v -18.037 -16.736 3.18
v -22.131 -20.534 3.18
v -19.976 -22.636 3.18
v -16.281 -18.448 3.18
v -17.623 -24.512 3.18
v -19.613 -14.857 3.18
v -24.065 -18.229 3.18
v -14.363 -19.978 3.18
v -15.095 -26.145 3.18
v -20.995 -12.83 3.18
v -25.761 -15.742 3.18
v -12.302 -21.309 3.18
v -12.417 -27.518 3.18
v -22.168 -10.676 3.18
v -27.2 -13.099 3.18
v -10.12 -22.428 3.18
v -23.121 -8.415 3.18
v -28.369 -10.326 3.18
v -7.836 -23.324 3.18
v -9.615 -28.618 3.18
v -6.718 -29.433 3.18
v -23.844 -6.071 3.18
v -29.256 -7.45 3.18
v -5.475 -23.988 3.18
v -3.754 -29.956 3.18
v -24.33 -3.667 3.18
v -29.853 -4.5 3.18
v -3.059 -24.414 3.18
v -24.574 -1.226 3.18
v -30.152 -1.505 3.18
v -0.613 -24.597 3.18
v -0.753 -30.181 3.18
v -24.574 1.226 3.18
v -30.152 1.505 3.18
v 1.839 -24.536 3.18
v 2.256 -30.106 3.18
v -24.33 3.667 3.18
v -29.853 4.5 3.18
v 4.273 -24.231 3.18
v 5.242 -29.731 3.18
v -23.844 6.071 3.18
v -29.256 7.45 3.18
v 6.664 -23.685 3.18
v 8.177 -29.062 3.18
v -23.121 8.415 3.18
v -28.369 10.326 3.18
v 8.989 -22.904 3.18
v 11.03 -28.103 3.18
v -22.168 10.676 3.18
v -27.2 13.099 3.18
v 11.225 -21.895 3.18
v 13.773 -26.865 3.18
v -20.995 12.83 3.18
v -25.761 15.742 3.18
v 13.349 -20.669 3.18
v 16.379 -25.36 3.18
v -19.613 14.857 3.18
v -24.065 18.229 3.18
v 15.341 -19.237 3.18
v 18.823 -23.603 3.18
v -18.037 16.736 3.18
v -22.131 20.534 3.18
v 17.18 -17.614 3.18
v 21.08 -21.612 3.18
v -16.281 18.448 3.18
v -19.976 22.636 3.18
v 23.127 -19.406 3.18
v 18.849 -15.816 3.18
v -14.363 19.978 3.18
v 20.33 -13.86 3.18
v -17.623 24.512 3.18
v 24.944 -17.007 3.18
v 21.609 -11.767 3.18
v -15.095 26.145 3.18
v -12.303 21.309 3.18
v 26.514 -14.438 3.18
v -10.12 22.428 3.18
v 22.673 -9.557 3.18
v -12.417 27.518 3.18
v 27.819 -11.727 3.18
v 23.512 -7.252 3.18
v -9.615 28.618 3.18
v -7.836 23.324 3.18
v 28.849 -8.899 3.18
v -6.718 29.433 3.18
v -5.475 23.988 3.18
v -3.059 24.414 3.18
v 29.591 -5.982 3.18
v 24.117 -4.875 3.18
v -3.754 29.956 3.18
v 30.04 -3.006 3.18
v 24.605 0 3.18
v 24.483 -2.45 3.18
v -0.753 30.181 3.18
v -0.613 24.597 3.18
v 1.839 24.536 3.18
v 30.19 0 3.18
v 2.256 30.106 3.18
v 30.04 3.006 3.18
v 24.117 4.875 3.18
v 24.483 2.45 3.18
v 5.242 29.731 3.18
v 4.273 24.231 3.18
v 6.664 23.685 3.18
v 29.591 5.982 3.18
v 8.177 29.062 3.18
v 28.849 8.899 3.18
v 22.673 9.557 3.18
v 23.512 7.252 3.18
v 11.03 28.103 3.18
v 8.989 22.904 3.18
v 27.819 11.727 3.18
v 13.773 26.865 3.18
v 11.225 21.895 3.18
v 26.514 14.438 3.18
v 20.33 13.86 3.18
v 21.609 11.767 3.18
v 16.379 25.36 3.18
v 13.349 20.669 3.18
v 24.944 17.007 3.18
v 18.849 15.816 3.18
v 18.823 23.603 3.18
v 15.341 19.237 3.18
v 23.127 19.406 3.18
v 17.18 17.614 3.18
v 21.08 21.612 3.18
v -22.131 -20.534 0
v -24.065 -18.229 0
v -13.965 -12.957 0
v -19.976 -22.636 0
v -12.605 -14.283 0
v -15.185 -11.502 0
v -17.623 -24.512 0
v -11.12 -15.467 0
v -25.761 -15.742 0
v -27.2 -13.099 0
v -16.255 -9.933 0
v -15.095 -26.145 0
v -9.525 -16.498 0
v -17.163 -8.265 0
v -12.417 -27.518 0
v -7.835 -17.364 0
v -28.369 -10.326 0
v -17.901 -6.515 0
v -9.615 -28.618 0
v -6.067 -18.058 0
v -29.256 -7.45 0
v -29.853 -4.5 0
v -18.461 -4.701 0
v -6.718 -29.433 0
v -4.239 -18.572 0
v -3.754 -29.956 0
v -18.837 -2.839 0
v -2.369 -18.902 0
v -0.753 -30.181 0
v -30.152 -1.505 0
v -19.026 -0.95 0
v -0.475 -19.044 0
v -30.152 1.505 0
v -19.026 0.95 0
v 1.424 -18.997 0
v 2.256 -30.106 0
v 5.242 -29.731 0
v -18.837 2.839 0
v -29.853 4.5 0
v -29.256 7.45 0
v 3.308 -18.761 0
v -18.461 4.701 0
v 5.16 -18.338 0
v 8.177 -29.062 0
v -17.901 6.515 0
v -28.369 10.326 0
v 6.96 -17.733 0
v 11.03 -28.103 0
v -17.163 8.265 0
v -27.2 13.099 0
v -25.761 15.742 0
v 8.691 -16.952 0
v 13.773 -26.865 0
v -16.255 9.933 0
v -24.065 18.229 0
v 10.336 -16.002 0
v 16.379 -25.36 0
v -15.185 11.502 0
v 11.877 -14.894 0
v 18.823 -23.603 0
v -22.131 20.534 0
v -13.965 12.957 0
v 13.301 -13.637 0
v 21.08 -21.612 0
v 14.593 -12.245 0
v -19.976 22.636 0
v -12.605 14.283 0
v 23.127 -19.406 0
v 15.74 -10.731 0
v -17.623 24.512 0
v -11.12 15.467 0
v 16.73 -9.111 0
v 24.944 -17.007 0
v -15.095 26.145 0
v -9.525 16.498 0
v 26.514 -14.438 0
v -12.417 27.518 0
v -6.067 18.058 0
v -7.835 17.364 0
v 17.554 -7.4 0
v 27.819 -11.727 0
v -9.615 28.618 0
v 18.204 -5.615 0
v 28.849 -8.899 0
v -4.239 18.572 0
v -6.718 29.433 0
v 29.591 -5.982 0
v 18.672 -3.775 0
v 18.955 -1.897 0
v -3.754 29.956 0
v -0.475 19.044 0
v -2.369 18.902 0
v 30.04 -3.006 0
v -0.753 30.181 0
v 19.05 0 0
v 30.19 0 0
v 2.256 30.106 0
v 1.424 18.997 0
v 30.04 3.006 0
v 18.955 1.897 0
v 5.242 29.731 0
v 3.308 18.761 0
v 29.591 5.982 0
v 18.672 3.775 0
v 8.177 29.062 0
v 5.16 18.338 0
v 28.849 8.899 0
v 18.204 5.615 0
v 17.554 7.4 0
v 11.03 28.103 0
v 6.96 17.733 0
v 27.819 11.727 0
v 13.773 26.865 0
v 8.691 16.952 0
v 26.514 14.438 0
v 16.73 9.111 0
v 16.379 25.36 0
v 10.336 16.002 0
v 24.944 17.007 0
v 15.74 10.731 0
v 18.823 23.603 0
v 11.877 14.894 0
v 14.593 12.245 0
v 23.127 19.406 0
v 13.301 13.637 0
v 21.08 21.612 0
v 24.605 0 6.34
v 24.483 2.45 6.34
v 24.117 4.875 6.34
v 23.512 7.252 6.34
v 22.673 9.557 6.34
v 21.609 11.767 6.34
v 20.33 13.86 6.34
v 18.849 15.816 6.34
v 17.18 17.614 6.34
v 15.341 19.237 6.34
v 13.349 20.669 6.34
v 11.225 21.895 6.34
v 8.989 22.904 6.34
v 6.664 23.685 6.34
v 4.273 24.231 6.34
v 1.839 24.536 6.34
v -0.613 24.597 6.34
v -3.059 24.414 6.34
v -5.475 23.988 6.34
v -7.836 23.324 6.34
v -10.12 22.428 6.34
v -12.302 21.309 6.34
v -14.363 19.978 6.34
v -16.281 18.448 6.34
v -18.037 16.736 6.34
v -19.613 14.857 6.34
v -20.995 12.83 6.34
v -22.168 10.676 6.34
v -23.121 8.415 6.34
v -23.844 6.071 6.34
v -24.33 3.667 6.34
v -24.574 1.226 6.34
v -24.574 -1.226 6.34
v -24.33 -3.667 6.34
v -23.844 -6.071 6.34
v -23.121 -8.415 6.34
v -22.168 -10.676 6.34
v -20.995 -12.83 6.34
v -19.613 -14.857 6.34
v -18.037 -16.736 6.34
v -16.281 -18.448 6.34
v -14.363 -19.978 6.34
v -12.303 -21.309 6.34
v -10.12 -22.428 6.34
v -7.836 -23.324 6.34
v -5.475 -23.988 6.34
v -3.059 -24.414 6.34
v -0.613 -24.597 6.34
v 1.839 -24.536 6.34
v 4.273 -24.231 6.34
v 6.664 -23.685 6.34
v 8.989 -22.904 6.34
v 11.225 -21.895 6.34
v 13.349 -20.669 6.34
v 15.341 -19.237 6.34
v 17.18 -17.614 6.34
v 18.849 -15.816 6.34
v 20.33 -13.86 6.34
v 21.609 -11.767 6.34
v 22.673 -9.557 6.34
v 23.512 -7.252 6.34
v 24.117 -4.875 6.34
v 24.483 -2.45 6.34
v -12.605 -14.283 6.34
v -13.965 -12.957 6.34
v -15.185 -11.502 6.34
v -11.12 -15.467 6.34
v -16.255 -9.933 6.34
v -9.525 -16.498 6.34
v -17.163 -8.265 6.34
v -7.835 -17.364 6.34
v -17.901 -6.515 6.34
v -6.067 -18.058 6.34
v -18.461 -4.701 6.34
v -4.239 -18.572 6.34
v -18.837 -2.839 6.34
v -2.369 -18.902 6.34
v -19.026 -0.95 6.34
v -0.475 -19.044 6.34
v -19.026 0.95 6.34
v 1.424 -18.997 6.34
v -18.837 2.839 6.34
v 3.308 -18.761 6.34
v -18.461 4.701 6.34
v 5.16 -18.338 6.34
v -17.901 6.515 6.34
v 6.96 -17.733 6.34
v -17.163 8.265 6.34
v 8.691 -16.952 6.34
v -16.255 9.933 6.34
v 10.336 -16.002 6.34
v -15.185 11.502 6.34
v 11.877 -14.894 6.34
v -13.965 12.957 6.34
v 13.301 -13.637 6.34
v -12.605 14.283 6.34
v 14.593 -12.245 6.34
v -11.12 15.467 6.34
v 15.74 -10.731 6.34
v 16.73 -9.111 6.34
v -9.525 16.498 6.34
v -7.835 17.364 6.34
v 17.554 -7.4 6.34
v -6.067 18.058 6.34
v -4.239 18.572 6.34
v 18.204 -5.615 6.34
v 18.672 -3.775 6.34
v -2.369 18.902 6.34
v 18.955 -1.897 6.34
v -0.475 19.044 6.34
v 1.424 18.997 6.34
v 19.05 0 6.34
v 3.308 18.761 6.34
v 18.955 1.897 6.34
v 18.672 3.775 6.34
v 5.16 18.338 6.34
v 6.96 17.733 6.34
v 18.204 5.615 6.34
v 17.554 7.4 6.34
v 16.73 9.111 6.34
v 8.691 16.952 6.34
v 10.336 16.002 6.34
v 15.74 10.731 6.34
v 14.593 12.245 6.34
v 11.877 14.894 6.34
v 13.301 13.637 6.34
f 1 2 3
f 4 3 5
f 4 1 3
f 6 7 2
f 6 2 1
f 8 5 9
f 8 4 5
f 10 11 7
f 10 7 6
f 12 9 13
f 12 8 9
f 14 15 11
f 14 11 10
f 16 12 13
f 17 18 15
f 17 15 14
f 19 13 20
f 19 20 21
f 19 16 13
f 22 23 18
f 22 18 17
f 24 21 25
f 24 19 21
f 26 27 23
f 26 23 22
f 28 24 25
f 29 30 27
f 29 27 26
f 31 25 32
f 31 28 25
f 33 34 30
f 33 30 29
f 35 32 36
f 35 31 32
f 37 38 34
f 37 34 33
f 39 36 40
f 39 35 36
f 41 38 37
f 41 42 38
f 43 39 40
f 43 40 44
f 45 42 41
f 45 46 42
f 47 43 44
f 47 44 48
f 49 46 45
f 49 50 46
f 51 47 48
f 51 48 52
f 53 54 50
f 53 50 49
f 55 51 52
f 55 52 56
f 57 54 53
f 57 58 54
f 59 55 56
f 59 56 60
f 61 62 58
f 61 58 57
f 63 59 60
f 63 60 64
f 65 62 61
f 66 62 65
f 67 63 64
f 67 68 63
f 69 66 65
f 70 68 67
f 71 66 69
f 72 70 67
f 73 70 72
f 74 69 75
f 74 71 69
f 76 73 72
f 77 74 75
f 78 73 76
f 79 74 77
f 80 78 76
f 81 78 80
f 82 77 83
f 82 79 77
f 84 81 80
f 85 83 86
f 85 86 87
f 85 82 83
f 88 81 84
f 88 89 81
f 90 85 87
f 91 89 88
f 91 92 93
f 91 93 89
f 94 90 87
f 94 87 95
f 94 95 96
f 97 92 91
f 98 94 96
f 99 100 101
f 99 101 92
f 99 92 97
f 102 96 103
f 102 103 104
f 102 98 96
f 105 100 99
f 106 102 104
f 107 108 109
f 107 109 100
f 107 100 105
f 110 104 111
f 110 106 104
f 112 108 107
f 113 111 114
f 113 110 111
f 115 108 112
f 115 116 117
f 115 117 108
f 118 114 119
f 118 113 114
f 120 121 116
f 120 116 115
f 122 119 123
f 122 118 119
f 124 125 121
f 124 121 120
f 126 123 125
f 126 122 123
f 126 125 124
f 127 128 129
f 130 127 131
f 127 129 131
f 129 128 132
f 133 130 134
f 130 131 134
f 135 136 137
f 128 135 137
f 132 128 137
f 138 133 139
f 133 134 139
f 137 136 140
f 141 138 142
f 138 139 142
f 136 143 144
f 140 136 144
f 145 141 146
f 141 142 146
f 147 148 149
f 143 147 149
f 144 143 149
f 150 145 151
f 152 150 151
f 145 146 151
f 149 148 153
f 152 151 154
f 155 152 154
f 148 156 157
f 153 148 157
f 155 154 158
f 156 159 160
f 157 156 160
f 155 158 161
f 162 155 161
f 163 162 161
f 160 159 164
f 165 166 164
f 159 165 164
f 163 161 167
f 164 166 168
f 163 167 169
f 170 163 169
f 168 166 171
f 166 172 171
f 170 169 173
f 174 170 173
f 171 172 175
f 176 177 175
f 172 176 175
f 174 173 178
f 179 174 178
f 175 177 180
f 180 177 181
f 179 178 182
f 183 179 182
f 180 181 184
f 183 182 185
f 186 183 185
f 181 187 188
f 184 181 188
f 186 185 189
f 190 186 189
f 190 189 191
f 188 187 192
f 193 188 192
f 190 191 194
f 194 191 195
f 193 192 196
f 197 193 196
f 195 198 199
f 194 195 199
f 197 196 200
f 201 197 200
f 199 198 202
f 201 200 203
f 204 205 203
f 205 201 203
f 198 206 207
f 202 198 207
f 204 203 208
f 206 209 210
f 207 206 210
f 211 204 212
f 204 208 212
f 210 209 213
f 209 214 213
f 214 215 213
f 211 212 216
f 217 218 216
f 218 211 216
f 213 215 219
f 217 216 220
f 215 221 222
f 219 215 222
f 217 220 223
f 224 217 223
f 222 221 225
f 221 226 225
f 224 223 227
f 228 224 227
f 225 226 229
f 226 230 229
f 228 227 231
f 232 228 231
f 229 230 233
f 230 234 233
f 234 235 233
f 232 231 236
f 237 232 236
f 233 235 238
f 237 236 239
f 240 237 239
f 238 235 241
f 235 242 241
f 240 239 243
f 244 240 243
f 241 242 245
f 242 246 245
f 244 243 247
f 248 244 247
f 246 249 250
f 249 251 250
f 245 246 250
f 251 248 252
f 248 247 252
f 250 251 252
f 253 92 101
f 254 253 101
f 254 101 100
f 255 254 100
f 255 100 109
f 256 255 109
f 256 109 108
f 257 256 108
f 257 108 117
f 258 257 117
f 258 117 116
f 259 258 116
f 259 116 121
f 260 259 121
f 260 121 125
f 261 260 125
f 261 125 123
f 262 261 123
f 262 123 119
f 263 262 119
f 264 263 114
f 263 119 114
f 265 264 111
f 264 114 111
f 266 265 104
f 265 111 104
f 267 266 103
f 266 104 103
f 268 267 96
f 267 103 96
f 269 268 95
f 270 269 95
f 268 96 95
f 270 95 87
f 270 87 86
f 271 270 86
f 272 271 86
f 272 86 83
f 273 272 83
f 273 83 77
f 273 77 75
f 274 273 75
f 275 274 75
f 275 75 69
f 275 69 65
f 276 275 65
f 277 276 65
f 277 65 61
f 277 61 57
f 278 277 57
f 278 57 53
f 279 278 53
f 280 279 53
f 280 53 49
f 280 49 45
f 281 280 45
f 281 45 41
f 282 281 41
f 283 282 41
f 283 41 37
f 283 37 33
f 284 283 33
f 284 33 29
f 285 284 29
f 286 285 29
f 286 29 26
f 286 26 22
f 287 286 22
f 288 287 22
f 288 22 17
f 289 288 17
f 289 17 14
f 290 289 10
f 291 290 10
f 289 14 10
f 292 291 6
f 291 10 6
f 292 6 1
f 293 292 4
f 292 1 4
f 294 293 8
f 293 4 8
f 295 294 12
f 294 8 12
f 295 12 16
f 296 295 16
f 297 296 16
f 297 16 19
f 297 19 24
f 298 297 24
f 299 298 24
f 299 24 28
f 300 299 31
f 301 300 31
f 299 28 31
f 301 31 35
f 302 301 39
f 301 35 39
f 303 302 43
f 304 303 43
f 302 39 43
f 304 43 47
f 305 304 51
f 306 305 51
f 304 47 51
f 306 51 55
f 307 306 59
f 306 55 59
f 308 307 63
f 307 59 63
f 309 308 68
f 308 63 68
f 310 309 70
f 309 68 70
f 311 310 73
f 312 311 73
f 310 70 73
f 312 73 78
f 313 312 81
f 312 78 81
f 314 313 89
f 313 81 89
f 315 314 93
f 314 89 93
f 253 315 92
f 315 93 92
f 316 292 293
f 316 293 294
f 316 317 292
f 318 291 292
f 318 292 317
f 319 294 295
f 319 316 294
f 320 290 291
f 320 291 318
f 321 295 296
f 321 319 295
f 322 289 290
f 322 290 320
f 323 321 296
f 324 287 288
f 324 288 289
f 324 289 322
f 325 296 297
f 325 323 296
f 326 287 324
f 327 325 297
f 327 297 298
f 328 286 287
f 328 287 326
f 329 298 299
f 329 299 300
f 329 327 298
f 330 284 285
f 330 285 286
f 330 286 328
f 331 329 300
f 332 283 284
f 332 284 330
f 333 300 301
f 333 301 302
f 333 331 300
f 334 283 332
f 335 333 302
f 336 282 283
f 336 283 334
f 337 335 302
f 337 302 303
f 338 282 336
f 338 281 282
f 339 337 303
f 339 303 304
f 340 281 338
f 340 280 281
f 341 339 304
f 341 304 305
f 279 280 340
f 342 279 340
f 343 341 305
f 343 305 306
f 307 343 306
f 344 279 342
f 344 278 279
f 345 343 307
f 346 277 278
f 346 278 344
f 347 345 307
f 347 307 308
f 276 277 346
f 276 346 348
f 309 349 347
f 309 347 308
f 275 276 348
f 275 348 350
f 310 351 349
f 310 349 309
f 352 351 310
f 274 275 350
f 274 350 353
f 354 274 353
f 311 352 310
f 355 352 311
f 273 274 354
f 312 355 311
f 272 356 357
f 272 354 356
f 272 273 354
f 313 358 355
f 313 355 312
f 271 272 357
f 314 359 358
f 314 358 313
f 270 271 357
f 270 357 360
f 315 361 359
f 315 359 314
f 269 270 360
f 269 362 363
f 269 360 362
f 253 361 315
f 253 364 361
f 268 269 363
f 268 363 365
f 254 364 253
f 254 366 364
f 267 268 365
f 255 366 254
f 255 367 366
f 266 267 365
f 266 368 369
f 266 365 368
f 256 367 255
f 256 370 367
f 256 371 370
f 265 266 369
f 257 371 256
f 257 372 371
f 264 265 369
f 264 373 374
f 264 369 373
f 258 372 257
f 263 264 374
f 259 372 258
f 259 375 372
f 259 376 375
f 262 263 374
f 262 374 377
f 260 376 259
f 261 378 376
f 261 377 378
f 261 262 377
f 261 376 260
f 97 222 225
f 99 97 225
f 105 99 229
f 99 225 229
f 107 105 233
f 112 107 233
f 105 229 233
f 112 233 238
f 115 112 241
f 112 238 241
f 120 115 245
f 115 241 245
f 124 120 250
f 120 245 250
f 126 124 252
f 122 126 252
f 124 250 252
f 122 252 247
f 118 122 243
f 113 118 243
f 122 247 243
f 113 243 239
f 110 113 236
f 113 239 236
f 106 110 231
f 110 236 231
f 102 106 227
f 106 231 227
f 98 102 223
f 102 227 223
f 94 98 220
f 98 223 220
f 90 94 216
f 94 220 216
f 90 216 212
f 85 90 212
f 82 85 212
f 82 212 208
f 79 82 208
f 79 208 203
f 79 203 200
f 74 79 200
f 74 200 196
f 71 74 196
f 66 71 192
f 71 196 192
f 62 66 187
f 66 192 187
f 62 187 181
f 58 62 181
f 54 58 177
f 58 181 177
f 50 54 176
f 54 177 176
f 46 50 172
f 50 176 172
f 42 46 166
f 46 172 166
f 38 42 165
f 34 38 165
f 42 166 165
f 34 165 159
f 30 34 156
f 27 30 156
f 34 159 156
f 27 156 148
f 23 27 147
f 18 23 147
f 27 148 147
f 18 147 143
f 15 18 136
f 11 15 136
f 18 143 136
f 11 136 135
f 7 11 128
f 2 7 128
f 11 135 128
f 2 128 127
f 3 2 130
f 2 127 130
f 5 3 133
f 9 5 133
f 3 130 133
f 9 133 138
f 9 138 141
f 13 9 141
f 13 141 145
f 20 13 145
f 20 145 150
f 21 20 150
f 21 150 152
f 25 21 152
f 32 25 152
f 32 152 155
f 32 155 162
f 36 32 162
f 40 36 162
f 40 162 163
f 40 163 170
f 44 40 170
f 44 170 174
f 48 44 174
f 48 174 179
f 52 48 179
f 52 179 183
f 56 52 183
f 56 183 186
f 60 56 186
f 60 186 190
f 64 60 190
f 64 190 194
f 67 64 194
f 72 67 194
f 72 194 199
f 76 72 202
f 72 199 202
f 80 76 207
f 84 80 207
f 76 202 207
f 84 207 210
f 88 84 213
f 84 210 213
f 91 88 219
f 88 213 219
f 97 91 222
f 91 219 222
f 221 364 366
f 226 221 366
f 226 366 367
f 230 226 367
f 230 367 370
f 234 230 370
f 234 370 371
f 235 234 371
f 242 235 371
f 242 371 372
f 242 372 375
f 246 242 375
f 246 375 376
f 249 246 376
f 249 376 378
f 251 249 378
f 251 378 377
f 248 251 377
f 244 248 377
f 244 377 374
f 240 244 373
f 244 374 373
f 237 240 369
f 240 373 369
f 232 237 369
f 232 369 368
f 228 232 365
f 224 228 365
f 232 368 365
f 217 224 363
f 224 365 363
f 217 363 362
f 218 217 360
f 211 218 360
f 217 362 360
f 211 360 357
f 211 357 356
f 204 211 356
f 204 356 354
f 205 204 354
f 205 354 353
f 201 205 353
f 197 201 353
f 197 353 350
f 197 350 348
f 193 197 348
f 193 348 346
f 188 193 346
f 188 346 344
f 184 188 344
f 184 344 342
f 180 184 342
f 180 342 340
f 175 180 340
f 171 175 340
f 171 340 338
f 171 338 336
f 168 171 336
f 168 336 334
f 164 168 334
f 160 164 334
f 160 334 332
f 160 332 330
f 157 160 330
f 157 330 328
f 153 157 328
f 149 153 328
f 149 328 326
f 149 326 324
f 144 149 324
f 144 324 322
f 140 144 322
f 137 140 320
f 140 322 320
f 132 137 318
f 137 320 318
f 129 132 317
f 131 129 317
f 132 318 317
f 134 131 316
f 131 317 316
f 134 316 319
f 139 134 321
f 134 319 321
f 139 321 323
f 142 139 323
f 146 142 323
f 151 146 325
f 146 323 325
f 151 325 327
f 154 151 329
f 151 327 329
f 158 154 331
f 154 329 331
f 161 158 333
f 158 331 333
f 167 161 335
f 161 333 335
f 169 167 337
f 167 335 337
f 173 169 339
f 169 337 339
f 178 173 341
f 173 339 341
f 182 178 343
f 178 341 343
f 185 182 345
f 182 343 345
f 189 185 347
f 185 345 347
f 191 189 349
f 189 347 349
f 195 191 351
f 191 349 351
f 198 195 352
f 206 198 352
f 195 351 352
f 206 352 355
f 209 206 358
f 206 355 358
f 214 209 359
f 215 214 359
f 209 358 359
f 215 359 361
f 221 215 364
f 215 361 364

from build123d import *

# Parameters (mm, degrees)
SKETCH_R     = 30.19
PAD_DEPTH    = 3.18
SKETCH001_R  = 24.605
PAD001_DEPTH = 6.34
SKETCH002_R  = 19.05
POCKET_DEPTH = 6.341


with BuildPart() as part:
    # Sketch → Pad (new body)
    with BuildSketch(Plane.XY):
        Circle(SKETCH_R)
    extrude(amount=PAD_DEPTH)

    # Sketch001 → Pad001 (join)
    with BuildSketch(Plane.XY):
        Circle(SKETCH001_R)
    extrude(amount=PAD001_DEPTH)

    # Sketch002 (on Face6 of Pad001) → Pocket (cut, through all)
    with BuildSketch(Plane.XY.offset(6.34)):
        Circle(SKETCH002_R)
    extrude(amount=-POCKET_DEPTH, mode=Mode.SUBTRACT)


solid = part.part
